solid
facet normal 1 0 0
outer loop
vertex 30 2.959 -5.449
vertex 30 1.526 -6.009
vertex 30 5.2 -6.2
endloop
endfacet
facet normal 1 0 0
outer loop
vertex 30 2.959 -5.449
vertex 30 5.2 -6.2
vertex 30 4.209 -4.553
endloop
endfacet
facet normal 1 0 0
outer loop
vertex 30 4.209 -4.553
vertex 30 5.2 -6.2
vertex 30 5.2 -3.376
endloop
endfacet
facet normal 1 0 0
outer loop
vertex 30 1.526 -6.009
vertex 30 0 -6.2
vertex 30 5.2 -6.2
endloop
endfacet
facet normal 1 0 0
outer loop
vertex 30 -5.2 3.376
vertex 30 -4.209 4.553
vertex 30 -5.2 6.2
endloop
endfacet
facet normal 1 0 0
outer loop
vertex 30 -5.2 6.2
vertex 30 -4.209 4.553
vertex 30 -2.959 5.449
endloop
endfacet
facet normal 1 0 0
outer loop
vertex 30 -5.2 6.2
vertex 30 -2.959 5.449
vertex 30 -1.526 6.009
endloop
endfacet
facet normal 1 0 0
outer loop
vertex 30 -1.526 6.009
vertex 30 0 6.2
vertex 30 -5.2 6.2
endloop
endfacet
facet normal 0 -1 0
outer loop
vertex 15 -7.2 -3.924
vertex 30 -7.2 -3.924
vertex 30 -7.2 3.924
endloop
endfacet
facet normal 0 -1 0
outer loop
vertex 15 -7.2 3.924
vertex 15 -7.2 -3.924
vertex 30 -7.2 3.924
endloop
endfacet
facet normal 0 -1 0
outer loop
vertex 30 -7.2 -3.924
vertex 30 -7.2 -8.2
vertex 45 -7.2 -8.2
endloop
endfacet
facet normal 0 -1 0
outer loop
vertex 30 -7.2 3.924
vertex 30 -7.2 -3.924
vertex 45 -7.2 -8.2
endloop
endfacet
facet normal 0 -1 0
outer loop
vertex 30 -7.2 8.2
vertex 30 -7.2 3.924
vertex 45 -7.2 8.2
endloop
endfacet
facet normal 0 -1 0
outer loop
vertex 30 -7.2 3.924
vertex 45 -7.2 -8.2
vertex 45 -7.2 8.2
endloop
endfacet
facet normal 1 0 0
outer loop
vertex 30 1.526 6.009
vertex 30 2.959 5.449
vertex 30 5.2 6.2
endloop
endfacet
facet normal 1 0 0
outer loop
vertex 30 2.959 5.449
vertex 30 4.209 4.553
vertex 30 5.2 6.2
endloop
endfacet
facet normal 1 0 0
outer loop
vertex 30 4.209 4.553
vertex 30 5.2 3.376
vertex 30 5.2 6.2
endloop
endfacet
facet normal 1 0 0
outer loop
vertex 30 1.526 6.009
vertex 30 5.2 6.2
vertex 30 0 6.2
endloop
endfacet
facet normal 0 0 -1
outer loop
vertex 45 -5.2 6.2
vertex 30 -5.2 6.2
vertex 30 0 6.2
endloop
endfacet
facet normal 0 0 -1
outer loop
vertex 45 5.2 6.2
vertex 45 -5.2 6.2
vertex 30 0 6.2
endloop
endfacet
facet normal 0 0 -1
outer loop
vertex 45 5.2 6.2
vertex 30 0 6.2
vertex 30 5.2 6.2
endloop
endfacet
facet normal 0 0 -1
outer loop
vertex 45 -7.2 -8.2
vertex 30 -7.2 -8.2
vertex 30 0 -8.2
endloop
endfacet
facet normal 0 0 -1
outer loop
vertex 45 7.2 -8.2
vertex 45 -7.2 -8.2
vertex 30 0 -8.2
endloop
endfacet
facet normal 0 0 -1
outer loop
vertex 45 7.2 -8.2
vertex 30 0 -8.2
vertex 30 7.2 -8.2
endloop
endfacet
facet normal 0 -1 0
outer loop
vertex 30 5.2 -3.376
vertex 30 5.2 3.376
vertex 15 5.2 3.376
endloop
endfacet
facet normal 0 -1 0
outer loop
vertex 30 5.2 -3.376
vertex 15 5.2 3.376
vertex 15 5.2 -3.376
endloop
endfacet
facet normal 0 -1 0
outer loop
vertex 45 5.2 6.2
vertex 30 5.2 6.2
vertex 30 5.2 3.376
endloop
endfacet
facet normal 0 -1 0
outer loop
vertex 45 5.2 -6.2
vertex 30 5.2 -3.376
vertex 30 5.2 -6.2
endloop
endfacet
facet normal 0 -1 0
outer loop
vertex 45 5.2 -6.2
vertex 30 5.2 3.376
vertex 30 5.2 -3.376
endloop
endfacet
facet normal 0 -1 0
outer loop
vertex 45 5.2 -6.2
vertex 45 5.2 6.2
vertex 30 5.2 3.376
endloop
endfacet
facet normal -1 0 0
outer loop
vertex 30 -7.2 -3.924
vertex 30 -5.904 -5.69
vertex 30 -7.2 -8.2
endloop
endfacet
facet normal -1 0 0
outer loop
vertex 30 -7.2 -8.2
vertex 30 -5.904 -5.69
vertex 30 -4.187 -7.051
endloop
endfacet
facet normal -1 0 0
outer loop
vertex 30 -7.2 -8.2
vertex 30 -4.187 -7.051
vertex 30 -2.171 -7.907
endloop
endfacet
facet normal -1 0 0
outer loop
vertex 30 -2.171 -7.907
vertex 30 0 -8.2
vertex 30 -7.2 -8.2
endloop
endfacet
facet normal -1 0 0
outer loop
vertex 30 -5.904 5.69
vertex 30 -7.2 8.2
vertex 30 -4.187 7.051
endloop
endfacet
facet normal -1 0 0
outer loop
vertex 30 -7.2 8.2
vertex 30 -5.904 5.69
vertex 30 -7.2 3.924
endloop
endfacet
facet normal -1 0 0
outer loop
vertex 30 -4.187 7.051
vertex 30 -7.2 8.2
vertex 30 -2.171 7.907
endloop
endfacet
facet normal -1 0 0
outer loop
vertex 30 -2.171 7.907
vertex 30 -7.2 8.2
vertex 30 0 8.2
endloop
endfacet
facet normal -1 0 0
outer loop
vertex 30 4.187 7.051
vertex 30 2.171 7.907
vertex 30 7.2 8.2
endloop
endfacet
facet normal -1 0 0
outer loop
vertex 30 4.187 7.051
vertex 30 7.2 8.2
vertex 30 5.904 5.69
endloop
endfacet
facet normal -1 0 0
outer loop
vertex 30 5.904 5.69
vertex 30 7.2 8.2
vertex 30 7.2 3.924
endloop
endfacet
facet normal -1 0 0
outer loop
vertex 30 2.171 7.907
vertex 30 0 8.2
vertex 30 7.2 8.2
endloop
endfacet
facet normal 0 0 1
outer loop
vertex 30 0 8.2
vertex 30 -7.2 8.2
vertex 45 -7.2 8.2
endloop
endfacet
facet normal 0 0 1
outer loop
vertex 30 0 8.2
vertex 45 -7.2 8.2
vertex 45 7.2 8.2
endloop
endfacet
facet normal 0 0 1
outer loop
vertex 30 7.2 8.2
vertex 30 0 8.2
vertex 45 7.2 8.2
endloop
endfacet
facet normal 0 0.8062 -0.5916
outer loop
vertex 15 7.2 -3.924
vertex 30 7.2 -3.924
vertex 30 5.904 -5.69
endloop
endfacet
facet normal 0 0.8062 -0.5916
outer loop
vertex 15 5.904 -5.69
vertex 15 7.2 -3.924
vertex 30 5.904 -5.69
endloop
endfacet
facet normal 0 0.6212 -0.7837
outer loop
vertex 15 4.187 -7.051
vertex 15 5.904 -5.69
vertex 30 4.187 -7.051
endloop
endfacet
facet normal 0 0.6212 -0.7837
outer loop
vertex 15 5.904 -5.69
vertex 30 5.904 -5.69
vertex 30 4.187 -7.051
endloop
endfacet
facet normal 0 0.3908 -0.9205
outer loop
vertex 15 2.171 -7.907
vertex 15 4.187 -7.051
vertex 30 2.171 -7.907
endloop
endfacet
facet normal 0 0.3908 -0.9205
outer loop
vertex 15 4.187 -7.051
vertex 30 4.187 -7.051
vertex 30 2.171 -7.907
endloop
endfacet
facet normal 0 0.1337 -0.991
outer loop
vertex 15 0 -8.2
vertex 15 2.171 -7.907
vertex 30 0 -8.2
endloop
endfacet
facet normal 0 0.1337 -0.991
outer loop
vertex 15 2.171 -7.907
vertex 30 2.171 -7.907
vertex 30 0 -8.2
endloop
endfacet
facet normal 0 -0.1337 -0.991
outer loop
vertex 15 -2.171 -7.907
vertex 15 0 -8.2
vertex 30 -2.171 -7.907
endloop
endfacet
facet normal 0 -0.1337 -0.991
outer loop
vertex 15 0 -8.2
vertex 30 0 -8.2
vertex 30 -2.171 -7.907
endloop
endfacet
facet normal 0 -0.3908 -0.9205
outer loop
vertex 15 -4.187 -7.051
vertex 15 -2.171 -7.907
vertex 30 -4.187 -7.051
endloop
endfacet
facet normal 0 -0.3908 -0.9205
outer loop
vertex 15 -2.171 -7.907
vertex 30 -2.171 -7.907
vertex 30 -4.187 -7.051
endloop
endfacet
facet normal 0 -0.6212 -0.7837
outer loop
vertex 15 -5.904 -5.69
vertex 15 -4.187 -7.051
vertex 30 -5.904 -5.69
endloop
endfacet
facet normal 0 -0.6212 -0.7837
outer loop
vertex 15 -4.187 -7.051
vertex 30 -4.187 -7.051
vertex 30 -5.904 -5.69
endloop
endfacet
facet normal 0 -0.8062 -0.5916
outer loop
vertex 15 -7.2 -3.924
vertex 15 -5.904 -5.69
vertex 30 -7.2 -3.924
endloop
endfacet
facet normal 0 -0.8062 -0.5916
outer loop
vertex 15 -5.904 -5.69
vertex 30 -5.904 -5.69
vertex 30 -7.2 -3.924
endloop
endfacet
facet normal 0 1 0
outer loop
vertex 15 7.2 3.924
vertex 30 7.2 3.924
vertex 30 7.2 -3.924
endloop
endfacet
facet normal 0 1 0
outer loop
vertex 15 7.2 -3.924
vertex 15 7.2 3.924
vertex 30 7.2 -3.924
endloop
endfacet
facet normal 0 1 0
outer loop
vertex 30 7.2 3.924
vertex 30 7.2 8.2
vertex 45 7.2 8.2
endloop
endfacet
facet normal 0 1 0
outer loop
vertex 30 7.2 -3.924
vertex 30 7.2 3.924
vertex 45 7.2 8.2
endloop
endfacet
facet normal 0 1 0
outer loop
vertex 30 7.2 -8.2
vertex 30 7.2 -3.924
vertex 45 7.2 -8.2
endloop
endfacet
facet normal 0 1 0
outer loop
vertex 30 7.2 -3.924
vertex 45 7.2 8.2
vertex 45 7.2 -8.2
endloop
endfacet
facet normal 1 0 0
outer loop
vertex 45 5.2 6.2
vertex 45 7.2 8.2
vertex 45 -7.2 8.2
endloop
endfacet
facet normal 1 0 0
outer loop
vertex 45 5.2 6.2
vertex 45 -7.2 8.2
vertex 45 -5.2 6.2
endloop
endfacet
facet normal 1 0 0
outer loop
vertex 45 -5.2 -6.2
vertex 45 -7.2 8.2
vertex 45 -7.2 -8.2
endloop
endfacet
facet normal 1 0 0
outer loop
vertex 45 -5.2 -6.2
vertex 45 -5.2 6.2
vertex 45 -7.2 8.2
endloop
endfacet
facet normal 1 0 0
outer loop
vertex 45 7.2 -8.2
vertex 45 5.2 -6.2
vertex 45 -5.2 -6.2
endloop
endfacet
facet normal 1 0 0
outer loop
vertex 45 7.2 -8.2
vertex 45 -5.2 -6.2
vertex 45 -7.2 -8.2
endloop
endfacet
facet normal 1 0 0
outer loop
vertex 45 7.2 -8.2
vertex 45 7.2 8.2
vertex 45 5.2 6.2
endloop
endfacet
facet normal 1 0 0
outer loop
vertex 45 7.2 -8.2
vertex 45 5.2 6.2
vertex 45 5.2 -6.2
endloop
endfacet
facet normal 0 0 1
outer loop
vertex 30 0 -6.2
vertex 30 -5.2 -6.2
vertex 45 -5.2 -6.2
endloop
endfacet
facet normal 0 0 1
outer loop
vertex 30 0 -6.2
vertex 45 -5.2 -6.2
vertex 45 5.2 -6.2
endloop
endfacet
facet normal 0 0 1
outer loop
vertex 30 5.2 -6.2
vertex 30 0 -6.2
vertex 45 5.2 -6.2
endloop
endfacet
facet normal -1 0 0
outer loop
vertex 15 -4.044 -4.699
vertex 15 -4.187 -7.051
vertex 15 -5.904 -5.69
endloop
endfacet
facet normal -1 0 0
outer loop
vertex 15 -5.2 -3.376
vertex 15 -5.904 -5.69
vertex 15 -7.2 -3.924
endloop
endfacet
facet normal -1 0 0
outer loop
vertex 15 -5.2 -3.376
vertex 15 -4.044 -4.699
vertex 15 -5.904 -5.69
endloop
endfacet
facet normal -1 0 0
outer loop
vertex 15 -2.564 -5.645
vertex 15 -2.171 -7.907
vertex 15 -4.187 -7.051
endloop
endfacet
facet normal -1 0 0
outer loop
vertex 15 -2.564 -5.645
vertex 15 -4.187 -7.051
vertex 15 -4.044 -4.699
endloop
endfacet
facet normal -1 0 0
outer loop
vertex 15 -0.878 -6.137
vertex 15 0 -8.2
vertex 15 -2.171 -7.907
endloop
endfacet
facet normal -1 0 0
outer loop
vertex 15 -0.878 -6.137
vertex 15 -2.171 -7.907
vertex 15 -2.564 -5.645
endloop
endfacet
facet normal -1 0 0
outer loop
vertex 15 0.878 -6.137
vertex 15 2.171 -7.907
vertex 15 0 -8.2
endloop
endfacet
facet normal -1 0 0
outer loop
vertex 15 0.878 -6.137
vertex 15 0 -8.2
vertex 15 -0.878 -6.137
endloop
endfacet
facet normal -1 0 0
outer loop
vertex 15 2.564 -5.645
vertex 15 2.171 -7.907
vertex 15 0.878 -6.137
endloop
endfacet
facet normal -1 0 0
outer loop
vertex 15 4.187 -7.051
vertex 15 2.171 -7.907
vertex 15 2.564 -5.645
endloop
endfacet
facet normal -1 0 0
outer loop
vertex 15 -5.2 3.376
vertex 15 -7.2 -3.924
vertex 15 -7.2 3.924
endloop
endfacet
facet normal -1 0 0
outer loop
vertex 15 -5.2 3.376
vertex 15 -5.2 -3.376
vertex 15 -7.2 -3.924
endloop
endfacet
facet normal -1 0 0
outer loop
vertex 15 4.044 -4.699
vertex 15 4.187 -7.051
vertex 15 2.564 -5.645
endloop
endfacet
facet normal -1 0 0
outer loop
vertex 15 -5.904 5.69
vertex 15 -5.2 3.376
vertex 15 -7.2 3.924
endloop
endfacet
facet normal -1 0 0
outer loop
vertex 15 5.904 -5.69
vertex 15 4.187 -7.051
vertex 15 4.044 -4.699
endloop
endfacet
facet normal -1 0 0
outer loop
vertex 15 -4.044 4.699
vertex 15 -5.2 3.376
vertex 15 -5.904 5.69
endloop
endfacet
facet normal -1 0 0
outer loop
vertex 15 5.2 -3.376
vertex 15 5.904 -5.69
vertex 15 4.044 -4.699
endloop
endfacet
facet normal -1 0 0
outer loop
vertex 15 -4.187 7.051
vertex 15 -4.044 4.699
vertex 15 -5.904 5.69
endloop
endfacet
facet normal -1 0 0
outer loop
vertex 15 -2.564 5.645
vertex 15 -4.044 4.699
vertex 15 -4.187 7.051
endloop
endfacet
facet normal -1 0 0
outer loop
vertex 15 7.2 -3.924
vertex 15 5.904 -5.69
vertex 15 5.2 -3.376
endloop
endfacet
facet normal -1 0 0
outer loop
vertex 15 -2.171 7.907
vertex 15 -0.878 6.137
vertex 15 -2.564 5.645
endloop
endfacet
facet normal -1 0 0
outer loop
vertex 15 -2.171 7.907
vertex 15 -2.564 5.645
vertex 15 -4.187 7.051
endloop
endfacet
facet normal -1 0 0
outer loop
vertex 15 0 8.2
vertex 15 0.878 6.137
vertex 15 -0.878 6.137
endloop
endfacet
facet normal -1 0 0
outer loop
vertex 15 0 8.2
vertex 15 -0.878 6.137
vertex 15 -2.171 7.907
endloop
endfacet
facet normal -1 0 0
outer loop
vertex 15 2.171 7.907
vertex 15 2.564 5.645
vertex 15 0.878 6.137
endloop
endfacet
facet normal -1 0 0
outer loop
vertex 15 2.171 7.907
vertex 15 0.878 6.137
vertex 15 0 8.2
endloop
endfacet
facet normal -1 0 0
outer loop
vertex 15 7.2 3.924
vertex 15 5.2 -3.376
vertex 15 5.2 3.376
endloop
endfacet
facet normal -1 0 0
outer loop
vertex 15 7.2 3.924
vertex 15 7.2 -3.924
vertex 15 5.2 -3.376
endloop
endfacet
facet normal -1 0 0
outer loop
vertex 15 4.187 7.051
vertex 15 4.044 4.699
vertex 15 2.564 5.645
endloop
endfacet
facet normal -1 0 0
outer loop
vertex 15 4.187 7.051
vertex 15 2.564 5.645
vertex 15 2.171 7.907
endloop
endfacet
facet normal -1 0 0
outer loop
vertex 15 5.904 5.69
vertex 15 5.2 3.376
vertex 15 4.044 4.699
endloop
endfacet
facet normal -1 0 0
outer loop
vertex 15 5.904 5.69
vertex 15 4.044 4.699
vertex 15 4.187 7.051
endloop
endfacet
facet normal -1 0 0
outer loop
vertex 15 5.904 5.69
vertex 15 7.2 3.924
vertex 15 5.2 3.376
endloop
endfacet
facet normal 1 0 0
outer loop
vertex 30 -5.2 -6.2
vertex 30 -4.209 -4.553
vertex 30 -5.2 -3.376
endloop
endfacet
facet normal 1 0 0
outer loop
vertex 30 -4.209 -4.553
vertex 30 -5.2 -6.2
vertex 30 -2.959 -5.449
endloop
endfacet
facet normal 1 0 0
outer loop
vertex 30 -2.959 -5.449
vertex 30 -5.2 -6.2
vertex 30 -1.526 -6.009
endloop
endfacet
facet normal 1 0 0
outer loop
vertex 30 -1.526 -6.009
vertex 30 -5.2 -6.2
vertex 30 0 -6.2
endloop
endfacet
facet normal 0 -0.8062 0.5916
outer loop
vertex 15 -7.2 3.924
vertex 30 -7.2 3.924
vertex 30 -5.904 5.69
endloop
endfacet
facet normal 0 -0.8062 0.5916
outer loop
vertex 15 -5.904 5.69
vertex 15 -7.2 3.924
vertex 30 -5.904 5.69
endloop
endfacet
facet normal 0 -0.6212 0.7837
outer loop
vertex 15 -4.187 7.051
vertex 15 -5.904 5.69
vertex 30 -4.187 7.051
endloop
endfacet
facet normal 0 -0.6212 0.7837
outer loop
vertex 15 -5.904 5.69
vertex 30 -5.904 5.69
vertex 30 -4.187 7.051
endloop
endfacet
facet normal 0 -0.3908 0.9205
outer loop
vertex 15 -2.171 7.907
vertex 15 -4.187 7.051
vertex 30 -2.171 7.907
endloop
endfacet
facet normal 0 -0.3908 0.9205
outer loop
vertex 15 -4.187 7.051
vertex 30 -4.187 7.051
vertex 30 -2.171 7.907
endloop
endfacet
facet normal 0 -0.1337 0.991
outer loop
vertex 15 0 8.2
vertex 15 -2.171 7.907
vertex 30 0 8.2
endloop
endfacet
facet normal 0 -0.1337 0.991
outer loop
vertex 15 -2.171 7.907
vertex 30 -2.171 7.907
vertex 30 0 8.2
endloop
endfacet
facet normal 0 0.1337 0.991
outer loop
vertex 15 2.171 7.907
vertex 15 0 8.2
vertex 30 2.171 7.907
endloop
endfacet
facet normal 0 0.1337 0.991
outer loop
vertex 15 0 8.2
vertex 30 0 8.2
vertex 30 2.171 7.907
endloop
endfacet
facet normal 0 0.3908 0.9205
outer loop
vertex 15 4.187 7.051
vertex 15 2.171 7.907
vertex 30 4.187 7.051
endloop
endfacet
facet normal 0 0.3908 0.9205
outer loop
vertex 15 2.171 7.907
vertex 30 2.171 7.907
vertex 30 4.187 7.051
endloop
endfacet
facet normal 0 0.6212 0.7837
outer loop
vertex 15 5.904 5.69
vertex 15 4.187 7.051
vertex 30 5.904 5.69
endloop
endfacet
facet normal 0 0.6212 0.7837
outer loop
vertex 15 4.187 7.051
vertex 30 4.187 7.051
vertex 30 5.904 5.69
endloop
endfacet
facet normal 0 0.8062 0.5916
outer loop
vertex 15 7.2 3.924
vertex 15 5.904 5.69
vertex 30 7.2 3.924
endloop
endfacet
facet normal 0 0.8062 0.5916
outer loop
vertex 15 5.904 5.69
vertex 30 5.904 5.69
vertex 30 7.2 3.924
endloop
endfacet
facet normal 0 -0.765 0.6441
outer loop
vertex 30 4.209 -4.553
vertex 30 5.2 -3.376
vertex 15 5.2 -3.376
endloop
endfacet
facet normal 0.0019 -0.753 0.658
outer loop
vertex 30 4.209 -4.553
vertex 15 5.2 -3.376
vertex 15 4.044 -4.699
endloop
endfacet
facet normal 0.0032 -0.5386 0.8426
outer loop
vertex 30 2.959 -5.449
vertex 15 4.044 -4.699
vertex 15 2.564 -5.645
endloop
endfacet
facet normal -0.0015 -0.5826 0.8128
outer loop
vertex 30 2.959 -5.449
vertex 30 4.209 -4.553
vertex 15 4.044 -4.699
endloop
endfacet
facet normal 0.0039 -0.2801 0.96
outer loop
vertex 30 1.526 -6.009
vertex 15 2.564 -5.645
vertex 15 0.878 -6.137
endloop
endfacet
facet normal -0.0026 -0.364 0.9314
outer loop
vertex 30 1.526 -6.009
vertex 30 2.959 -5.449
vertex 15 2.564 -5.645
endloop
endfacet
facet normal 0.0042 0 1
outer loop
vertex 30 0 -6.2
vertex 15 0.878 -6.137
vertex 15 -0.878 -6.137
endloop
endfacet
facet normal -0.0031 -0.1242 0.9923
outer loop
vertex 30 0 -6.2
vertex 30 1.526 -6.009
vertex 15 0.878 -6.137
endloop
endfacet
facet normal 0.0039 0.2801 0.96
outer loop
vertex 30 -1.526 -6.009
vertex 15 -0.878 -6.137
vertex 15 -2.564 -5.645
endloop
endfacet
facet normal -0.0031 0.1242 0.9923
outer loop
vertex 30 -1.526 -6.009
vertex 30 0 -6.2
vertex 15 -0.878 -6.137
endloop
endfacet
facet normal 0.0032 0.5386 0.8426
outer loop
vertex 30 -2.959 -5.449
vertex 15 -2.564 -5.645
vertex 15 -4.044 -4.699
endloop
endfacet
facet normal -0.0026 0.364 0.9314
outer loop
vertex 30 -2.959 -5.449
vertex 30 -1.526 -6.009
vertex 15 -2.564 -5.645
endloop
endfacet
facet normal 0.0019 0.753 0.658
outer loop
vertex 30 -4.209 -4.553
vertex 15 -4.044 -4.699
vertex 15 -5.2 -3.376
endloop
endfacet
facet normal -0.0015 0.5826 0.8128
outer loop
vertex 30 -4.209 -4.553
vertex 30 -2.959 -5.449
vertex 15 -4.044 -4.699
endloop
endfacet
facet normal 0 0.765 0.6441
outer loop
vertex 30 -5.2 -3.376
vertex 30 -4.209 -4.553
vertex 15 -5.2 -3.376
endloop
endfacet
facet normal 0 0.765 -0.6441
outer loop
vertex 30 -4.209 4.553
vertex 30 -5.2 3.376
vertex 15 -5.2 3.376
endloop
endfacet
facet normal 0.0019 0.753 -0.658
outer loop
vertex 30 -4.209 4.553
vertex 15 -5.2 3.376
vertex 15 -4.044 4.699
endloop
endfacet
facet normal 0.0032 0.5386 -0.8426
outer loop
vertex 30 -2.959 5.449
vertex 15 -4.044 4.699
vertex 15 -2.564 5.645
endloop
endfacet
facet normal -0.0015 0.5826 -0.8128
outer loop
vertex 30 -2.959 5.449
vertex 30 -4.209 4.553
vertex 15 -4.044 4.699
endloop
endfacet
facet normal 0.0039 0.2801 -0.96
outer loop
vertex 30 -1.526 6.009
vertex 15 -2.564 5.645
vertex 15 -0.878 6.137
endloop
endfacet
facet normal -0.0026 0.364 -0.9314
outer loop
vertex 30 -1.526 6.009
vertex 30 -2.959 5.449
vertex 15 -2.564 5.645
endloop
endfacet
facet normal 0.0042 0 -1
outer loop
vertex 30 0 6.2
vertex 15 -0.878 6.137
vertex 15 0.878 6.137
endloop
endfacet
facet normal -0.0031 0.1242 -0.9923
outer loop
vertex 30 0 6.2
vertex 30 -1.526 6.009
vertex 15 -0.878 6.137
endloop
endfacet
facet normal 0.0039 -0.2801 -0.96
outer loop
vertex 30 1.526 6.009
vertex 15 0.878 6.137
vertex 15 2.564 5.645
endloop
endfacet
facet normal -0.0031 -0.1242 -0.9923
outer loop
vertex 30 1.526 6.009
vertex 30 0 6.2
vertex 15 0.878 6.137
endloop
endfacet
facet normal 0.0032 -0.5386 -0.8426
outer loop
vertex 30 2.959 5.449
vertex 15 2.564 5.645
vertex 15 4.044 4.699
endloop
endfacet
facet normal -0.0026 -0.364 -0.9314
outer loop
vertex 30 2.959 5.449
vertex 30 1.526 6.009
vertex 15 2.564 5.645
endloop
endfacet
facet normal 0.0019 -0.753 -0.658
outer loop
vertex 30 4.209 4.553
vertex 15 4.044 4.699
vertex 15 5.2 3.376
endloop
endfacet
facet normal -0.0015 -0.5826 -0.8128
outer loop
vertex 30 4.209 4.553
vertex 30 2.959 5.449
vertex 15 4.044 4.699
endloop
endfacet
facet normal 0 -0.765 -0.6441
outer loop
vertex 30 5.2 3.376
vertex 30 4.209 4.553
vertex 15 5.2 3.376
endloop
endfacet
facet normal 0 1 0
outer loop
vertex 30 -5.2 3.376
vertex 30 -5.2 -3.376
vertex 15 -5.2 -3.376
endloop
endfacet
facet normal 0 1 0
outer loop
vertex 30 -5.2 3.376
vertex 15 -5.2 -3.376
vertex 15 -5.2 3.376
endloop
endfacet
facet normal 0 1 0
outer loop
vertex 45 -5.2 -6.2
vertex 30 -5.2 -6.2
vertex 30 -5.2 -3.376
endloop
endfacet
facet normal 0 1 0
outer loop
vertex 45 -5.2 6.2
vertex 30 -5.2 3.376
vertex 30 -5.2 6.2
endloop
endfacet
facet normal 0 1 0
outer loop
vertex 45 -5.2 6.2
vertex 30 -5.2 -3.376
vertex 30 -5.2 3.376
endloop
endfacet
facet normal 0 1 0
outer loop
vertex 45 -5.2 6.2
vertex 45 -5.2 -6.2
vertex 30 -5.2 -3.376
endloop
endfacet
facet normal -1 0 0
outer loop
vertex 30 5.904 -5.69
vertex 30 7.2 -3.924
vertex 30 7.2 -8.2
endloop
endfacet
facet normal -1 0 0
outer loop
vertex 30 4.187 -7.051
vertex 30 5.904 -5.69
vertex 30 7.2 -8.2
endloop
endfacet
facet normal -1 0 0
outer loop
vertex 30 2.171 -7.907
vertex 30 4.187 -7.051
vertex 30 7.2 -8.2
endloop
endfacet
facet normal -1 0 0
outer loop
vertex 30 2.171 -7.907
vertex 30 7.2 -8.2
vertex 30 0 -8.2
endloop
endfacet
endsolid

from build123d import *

# Parameters (mm, degrees)
BOSS_EXTRUDE1_START = 30
SKETCH1_W           = 16.4
SKETCH1_H           = 14.4
SKETCH1_W_2         = 12.4
SKETCH1_H_2         = 10.4
BOSS_EXTRUDE1_DEPTH = 15
BOSS_EXTRUDE2_START = 30
BOSS_EXTRUDE2_DEPTH = 15


with BuildPart() as part:
    # Sketch1 → Boss-Extrude1 (new body)
    with BuildSketch(Plane(origin=(0, 0, 0), x_dir=(0, 0, -1), z_dir=(1, 0, 0)).offset(BOSS_EXTRUDE1_START)):
        Rectangle(SKETCH1_W, SKETCH1_H)
        Rectangle(SKETCH1_W_2, SKETCH1_H_2, mode=Mode.SUBTRACT)
    extrude(amount=BOSS_EXTRUDE1_DEPTH)

    # Sketch2 → Boss-Extrude2 (add)
    with BuildSketch(Plane(origin=(0, 0, 0), x_dir=(0, 0, -1), z_dir=(1, 0, 0)).offset(BOSS_EXTRUDE2_START)):
        with BuildLine():
            Line((-3.924283374, 7.2), (3.924283374, 7.2))
            ThreePointArc((3.924283374, 7.2), (8.2, 0), (3.924283374, -7.2))
            Line((3.924283374, -7.2), (-3.924283374, -7.2))
            ThreePointArc((-3.924283374, -7.2), (-8.2, 0), (-3.924283374, 7.2))
        make_face()
        with BuildLine():
            Line((-3.376388603, 5.2), (3.376388603, 5.2))
            ThreePointArc((3.376388603, 5.2), (6.2, 0), (3.376388603, -5.2))
            Line((3.376388603, -5.2), (-3.376388603, -5.2))
            ThreePointArc((-3.376388603, -5.2), (-6.2, 0), (-3.376388603, 5.2))
        make_face(mode=Mode.SUBTRACT)
    extrude(amount=-BOSS_EXTRUDE2_DEPTH)


solid = part.part
